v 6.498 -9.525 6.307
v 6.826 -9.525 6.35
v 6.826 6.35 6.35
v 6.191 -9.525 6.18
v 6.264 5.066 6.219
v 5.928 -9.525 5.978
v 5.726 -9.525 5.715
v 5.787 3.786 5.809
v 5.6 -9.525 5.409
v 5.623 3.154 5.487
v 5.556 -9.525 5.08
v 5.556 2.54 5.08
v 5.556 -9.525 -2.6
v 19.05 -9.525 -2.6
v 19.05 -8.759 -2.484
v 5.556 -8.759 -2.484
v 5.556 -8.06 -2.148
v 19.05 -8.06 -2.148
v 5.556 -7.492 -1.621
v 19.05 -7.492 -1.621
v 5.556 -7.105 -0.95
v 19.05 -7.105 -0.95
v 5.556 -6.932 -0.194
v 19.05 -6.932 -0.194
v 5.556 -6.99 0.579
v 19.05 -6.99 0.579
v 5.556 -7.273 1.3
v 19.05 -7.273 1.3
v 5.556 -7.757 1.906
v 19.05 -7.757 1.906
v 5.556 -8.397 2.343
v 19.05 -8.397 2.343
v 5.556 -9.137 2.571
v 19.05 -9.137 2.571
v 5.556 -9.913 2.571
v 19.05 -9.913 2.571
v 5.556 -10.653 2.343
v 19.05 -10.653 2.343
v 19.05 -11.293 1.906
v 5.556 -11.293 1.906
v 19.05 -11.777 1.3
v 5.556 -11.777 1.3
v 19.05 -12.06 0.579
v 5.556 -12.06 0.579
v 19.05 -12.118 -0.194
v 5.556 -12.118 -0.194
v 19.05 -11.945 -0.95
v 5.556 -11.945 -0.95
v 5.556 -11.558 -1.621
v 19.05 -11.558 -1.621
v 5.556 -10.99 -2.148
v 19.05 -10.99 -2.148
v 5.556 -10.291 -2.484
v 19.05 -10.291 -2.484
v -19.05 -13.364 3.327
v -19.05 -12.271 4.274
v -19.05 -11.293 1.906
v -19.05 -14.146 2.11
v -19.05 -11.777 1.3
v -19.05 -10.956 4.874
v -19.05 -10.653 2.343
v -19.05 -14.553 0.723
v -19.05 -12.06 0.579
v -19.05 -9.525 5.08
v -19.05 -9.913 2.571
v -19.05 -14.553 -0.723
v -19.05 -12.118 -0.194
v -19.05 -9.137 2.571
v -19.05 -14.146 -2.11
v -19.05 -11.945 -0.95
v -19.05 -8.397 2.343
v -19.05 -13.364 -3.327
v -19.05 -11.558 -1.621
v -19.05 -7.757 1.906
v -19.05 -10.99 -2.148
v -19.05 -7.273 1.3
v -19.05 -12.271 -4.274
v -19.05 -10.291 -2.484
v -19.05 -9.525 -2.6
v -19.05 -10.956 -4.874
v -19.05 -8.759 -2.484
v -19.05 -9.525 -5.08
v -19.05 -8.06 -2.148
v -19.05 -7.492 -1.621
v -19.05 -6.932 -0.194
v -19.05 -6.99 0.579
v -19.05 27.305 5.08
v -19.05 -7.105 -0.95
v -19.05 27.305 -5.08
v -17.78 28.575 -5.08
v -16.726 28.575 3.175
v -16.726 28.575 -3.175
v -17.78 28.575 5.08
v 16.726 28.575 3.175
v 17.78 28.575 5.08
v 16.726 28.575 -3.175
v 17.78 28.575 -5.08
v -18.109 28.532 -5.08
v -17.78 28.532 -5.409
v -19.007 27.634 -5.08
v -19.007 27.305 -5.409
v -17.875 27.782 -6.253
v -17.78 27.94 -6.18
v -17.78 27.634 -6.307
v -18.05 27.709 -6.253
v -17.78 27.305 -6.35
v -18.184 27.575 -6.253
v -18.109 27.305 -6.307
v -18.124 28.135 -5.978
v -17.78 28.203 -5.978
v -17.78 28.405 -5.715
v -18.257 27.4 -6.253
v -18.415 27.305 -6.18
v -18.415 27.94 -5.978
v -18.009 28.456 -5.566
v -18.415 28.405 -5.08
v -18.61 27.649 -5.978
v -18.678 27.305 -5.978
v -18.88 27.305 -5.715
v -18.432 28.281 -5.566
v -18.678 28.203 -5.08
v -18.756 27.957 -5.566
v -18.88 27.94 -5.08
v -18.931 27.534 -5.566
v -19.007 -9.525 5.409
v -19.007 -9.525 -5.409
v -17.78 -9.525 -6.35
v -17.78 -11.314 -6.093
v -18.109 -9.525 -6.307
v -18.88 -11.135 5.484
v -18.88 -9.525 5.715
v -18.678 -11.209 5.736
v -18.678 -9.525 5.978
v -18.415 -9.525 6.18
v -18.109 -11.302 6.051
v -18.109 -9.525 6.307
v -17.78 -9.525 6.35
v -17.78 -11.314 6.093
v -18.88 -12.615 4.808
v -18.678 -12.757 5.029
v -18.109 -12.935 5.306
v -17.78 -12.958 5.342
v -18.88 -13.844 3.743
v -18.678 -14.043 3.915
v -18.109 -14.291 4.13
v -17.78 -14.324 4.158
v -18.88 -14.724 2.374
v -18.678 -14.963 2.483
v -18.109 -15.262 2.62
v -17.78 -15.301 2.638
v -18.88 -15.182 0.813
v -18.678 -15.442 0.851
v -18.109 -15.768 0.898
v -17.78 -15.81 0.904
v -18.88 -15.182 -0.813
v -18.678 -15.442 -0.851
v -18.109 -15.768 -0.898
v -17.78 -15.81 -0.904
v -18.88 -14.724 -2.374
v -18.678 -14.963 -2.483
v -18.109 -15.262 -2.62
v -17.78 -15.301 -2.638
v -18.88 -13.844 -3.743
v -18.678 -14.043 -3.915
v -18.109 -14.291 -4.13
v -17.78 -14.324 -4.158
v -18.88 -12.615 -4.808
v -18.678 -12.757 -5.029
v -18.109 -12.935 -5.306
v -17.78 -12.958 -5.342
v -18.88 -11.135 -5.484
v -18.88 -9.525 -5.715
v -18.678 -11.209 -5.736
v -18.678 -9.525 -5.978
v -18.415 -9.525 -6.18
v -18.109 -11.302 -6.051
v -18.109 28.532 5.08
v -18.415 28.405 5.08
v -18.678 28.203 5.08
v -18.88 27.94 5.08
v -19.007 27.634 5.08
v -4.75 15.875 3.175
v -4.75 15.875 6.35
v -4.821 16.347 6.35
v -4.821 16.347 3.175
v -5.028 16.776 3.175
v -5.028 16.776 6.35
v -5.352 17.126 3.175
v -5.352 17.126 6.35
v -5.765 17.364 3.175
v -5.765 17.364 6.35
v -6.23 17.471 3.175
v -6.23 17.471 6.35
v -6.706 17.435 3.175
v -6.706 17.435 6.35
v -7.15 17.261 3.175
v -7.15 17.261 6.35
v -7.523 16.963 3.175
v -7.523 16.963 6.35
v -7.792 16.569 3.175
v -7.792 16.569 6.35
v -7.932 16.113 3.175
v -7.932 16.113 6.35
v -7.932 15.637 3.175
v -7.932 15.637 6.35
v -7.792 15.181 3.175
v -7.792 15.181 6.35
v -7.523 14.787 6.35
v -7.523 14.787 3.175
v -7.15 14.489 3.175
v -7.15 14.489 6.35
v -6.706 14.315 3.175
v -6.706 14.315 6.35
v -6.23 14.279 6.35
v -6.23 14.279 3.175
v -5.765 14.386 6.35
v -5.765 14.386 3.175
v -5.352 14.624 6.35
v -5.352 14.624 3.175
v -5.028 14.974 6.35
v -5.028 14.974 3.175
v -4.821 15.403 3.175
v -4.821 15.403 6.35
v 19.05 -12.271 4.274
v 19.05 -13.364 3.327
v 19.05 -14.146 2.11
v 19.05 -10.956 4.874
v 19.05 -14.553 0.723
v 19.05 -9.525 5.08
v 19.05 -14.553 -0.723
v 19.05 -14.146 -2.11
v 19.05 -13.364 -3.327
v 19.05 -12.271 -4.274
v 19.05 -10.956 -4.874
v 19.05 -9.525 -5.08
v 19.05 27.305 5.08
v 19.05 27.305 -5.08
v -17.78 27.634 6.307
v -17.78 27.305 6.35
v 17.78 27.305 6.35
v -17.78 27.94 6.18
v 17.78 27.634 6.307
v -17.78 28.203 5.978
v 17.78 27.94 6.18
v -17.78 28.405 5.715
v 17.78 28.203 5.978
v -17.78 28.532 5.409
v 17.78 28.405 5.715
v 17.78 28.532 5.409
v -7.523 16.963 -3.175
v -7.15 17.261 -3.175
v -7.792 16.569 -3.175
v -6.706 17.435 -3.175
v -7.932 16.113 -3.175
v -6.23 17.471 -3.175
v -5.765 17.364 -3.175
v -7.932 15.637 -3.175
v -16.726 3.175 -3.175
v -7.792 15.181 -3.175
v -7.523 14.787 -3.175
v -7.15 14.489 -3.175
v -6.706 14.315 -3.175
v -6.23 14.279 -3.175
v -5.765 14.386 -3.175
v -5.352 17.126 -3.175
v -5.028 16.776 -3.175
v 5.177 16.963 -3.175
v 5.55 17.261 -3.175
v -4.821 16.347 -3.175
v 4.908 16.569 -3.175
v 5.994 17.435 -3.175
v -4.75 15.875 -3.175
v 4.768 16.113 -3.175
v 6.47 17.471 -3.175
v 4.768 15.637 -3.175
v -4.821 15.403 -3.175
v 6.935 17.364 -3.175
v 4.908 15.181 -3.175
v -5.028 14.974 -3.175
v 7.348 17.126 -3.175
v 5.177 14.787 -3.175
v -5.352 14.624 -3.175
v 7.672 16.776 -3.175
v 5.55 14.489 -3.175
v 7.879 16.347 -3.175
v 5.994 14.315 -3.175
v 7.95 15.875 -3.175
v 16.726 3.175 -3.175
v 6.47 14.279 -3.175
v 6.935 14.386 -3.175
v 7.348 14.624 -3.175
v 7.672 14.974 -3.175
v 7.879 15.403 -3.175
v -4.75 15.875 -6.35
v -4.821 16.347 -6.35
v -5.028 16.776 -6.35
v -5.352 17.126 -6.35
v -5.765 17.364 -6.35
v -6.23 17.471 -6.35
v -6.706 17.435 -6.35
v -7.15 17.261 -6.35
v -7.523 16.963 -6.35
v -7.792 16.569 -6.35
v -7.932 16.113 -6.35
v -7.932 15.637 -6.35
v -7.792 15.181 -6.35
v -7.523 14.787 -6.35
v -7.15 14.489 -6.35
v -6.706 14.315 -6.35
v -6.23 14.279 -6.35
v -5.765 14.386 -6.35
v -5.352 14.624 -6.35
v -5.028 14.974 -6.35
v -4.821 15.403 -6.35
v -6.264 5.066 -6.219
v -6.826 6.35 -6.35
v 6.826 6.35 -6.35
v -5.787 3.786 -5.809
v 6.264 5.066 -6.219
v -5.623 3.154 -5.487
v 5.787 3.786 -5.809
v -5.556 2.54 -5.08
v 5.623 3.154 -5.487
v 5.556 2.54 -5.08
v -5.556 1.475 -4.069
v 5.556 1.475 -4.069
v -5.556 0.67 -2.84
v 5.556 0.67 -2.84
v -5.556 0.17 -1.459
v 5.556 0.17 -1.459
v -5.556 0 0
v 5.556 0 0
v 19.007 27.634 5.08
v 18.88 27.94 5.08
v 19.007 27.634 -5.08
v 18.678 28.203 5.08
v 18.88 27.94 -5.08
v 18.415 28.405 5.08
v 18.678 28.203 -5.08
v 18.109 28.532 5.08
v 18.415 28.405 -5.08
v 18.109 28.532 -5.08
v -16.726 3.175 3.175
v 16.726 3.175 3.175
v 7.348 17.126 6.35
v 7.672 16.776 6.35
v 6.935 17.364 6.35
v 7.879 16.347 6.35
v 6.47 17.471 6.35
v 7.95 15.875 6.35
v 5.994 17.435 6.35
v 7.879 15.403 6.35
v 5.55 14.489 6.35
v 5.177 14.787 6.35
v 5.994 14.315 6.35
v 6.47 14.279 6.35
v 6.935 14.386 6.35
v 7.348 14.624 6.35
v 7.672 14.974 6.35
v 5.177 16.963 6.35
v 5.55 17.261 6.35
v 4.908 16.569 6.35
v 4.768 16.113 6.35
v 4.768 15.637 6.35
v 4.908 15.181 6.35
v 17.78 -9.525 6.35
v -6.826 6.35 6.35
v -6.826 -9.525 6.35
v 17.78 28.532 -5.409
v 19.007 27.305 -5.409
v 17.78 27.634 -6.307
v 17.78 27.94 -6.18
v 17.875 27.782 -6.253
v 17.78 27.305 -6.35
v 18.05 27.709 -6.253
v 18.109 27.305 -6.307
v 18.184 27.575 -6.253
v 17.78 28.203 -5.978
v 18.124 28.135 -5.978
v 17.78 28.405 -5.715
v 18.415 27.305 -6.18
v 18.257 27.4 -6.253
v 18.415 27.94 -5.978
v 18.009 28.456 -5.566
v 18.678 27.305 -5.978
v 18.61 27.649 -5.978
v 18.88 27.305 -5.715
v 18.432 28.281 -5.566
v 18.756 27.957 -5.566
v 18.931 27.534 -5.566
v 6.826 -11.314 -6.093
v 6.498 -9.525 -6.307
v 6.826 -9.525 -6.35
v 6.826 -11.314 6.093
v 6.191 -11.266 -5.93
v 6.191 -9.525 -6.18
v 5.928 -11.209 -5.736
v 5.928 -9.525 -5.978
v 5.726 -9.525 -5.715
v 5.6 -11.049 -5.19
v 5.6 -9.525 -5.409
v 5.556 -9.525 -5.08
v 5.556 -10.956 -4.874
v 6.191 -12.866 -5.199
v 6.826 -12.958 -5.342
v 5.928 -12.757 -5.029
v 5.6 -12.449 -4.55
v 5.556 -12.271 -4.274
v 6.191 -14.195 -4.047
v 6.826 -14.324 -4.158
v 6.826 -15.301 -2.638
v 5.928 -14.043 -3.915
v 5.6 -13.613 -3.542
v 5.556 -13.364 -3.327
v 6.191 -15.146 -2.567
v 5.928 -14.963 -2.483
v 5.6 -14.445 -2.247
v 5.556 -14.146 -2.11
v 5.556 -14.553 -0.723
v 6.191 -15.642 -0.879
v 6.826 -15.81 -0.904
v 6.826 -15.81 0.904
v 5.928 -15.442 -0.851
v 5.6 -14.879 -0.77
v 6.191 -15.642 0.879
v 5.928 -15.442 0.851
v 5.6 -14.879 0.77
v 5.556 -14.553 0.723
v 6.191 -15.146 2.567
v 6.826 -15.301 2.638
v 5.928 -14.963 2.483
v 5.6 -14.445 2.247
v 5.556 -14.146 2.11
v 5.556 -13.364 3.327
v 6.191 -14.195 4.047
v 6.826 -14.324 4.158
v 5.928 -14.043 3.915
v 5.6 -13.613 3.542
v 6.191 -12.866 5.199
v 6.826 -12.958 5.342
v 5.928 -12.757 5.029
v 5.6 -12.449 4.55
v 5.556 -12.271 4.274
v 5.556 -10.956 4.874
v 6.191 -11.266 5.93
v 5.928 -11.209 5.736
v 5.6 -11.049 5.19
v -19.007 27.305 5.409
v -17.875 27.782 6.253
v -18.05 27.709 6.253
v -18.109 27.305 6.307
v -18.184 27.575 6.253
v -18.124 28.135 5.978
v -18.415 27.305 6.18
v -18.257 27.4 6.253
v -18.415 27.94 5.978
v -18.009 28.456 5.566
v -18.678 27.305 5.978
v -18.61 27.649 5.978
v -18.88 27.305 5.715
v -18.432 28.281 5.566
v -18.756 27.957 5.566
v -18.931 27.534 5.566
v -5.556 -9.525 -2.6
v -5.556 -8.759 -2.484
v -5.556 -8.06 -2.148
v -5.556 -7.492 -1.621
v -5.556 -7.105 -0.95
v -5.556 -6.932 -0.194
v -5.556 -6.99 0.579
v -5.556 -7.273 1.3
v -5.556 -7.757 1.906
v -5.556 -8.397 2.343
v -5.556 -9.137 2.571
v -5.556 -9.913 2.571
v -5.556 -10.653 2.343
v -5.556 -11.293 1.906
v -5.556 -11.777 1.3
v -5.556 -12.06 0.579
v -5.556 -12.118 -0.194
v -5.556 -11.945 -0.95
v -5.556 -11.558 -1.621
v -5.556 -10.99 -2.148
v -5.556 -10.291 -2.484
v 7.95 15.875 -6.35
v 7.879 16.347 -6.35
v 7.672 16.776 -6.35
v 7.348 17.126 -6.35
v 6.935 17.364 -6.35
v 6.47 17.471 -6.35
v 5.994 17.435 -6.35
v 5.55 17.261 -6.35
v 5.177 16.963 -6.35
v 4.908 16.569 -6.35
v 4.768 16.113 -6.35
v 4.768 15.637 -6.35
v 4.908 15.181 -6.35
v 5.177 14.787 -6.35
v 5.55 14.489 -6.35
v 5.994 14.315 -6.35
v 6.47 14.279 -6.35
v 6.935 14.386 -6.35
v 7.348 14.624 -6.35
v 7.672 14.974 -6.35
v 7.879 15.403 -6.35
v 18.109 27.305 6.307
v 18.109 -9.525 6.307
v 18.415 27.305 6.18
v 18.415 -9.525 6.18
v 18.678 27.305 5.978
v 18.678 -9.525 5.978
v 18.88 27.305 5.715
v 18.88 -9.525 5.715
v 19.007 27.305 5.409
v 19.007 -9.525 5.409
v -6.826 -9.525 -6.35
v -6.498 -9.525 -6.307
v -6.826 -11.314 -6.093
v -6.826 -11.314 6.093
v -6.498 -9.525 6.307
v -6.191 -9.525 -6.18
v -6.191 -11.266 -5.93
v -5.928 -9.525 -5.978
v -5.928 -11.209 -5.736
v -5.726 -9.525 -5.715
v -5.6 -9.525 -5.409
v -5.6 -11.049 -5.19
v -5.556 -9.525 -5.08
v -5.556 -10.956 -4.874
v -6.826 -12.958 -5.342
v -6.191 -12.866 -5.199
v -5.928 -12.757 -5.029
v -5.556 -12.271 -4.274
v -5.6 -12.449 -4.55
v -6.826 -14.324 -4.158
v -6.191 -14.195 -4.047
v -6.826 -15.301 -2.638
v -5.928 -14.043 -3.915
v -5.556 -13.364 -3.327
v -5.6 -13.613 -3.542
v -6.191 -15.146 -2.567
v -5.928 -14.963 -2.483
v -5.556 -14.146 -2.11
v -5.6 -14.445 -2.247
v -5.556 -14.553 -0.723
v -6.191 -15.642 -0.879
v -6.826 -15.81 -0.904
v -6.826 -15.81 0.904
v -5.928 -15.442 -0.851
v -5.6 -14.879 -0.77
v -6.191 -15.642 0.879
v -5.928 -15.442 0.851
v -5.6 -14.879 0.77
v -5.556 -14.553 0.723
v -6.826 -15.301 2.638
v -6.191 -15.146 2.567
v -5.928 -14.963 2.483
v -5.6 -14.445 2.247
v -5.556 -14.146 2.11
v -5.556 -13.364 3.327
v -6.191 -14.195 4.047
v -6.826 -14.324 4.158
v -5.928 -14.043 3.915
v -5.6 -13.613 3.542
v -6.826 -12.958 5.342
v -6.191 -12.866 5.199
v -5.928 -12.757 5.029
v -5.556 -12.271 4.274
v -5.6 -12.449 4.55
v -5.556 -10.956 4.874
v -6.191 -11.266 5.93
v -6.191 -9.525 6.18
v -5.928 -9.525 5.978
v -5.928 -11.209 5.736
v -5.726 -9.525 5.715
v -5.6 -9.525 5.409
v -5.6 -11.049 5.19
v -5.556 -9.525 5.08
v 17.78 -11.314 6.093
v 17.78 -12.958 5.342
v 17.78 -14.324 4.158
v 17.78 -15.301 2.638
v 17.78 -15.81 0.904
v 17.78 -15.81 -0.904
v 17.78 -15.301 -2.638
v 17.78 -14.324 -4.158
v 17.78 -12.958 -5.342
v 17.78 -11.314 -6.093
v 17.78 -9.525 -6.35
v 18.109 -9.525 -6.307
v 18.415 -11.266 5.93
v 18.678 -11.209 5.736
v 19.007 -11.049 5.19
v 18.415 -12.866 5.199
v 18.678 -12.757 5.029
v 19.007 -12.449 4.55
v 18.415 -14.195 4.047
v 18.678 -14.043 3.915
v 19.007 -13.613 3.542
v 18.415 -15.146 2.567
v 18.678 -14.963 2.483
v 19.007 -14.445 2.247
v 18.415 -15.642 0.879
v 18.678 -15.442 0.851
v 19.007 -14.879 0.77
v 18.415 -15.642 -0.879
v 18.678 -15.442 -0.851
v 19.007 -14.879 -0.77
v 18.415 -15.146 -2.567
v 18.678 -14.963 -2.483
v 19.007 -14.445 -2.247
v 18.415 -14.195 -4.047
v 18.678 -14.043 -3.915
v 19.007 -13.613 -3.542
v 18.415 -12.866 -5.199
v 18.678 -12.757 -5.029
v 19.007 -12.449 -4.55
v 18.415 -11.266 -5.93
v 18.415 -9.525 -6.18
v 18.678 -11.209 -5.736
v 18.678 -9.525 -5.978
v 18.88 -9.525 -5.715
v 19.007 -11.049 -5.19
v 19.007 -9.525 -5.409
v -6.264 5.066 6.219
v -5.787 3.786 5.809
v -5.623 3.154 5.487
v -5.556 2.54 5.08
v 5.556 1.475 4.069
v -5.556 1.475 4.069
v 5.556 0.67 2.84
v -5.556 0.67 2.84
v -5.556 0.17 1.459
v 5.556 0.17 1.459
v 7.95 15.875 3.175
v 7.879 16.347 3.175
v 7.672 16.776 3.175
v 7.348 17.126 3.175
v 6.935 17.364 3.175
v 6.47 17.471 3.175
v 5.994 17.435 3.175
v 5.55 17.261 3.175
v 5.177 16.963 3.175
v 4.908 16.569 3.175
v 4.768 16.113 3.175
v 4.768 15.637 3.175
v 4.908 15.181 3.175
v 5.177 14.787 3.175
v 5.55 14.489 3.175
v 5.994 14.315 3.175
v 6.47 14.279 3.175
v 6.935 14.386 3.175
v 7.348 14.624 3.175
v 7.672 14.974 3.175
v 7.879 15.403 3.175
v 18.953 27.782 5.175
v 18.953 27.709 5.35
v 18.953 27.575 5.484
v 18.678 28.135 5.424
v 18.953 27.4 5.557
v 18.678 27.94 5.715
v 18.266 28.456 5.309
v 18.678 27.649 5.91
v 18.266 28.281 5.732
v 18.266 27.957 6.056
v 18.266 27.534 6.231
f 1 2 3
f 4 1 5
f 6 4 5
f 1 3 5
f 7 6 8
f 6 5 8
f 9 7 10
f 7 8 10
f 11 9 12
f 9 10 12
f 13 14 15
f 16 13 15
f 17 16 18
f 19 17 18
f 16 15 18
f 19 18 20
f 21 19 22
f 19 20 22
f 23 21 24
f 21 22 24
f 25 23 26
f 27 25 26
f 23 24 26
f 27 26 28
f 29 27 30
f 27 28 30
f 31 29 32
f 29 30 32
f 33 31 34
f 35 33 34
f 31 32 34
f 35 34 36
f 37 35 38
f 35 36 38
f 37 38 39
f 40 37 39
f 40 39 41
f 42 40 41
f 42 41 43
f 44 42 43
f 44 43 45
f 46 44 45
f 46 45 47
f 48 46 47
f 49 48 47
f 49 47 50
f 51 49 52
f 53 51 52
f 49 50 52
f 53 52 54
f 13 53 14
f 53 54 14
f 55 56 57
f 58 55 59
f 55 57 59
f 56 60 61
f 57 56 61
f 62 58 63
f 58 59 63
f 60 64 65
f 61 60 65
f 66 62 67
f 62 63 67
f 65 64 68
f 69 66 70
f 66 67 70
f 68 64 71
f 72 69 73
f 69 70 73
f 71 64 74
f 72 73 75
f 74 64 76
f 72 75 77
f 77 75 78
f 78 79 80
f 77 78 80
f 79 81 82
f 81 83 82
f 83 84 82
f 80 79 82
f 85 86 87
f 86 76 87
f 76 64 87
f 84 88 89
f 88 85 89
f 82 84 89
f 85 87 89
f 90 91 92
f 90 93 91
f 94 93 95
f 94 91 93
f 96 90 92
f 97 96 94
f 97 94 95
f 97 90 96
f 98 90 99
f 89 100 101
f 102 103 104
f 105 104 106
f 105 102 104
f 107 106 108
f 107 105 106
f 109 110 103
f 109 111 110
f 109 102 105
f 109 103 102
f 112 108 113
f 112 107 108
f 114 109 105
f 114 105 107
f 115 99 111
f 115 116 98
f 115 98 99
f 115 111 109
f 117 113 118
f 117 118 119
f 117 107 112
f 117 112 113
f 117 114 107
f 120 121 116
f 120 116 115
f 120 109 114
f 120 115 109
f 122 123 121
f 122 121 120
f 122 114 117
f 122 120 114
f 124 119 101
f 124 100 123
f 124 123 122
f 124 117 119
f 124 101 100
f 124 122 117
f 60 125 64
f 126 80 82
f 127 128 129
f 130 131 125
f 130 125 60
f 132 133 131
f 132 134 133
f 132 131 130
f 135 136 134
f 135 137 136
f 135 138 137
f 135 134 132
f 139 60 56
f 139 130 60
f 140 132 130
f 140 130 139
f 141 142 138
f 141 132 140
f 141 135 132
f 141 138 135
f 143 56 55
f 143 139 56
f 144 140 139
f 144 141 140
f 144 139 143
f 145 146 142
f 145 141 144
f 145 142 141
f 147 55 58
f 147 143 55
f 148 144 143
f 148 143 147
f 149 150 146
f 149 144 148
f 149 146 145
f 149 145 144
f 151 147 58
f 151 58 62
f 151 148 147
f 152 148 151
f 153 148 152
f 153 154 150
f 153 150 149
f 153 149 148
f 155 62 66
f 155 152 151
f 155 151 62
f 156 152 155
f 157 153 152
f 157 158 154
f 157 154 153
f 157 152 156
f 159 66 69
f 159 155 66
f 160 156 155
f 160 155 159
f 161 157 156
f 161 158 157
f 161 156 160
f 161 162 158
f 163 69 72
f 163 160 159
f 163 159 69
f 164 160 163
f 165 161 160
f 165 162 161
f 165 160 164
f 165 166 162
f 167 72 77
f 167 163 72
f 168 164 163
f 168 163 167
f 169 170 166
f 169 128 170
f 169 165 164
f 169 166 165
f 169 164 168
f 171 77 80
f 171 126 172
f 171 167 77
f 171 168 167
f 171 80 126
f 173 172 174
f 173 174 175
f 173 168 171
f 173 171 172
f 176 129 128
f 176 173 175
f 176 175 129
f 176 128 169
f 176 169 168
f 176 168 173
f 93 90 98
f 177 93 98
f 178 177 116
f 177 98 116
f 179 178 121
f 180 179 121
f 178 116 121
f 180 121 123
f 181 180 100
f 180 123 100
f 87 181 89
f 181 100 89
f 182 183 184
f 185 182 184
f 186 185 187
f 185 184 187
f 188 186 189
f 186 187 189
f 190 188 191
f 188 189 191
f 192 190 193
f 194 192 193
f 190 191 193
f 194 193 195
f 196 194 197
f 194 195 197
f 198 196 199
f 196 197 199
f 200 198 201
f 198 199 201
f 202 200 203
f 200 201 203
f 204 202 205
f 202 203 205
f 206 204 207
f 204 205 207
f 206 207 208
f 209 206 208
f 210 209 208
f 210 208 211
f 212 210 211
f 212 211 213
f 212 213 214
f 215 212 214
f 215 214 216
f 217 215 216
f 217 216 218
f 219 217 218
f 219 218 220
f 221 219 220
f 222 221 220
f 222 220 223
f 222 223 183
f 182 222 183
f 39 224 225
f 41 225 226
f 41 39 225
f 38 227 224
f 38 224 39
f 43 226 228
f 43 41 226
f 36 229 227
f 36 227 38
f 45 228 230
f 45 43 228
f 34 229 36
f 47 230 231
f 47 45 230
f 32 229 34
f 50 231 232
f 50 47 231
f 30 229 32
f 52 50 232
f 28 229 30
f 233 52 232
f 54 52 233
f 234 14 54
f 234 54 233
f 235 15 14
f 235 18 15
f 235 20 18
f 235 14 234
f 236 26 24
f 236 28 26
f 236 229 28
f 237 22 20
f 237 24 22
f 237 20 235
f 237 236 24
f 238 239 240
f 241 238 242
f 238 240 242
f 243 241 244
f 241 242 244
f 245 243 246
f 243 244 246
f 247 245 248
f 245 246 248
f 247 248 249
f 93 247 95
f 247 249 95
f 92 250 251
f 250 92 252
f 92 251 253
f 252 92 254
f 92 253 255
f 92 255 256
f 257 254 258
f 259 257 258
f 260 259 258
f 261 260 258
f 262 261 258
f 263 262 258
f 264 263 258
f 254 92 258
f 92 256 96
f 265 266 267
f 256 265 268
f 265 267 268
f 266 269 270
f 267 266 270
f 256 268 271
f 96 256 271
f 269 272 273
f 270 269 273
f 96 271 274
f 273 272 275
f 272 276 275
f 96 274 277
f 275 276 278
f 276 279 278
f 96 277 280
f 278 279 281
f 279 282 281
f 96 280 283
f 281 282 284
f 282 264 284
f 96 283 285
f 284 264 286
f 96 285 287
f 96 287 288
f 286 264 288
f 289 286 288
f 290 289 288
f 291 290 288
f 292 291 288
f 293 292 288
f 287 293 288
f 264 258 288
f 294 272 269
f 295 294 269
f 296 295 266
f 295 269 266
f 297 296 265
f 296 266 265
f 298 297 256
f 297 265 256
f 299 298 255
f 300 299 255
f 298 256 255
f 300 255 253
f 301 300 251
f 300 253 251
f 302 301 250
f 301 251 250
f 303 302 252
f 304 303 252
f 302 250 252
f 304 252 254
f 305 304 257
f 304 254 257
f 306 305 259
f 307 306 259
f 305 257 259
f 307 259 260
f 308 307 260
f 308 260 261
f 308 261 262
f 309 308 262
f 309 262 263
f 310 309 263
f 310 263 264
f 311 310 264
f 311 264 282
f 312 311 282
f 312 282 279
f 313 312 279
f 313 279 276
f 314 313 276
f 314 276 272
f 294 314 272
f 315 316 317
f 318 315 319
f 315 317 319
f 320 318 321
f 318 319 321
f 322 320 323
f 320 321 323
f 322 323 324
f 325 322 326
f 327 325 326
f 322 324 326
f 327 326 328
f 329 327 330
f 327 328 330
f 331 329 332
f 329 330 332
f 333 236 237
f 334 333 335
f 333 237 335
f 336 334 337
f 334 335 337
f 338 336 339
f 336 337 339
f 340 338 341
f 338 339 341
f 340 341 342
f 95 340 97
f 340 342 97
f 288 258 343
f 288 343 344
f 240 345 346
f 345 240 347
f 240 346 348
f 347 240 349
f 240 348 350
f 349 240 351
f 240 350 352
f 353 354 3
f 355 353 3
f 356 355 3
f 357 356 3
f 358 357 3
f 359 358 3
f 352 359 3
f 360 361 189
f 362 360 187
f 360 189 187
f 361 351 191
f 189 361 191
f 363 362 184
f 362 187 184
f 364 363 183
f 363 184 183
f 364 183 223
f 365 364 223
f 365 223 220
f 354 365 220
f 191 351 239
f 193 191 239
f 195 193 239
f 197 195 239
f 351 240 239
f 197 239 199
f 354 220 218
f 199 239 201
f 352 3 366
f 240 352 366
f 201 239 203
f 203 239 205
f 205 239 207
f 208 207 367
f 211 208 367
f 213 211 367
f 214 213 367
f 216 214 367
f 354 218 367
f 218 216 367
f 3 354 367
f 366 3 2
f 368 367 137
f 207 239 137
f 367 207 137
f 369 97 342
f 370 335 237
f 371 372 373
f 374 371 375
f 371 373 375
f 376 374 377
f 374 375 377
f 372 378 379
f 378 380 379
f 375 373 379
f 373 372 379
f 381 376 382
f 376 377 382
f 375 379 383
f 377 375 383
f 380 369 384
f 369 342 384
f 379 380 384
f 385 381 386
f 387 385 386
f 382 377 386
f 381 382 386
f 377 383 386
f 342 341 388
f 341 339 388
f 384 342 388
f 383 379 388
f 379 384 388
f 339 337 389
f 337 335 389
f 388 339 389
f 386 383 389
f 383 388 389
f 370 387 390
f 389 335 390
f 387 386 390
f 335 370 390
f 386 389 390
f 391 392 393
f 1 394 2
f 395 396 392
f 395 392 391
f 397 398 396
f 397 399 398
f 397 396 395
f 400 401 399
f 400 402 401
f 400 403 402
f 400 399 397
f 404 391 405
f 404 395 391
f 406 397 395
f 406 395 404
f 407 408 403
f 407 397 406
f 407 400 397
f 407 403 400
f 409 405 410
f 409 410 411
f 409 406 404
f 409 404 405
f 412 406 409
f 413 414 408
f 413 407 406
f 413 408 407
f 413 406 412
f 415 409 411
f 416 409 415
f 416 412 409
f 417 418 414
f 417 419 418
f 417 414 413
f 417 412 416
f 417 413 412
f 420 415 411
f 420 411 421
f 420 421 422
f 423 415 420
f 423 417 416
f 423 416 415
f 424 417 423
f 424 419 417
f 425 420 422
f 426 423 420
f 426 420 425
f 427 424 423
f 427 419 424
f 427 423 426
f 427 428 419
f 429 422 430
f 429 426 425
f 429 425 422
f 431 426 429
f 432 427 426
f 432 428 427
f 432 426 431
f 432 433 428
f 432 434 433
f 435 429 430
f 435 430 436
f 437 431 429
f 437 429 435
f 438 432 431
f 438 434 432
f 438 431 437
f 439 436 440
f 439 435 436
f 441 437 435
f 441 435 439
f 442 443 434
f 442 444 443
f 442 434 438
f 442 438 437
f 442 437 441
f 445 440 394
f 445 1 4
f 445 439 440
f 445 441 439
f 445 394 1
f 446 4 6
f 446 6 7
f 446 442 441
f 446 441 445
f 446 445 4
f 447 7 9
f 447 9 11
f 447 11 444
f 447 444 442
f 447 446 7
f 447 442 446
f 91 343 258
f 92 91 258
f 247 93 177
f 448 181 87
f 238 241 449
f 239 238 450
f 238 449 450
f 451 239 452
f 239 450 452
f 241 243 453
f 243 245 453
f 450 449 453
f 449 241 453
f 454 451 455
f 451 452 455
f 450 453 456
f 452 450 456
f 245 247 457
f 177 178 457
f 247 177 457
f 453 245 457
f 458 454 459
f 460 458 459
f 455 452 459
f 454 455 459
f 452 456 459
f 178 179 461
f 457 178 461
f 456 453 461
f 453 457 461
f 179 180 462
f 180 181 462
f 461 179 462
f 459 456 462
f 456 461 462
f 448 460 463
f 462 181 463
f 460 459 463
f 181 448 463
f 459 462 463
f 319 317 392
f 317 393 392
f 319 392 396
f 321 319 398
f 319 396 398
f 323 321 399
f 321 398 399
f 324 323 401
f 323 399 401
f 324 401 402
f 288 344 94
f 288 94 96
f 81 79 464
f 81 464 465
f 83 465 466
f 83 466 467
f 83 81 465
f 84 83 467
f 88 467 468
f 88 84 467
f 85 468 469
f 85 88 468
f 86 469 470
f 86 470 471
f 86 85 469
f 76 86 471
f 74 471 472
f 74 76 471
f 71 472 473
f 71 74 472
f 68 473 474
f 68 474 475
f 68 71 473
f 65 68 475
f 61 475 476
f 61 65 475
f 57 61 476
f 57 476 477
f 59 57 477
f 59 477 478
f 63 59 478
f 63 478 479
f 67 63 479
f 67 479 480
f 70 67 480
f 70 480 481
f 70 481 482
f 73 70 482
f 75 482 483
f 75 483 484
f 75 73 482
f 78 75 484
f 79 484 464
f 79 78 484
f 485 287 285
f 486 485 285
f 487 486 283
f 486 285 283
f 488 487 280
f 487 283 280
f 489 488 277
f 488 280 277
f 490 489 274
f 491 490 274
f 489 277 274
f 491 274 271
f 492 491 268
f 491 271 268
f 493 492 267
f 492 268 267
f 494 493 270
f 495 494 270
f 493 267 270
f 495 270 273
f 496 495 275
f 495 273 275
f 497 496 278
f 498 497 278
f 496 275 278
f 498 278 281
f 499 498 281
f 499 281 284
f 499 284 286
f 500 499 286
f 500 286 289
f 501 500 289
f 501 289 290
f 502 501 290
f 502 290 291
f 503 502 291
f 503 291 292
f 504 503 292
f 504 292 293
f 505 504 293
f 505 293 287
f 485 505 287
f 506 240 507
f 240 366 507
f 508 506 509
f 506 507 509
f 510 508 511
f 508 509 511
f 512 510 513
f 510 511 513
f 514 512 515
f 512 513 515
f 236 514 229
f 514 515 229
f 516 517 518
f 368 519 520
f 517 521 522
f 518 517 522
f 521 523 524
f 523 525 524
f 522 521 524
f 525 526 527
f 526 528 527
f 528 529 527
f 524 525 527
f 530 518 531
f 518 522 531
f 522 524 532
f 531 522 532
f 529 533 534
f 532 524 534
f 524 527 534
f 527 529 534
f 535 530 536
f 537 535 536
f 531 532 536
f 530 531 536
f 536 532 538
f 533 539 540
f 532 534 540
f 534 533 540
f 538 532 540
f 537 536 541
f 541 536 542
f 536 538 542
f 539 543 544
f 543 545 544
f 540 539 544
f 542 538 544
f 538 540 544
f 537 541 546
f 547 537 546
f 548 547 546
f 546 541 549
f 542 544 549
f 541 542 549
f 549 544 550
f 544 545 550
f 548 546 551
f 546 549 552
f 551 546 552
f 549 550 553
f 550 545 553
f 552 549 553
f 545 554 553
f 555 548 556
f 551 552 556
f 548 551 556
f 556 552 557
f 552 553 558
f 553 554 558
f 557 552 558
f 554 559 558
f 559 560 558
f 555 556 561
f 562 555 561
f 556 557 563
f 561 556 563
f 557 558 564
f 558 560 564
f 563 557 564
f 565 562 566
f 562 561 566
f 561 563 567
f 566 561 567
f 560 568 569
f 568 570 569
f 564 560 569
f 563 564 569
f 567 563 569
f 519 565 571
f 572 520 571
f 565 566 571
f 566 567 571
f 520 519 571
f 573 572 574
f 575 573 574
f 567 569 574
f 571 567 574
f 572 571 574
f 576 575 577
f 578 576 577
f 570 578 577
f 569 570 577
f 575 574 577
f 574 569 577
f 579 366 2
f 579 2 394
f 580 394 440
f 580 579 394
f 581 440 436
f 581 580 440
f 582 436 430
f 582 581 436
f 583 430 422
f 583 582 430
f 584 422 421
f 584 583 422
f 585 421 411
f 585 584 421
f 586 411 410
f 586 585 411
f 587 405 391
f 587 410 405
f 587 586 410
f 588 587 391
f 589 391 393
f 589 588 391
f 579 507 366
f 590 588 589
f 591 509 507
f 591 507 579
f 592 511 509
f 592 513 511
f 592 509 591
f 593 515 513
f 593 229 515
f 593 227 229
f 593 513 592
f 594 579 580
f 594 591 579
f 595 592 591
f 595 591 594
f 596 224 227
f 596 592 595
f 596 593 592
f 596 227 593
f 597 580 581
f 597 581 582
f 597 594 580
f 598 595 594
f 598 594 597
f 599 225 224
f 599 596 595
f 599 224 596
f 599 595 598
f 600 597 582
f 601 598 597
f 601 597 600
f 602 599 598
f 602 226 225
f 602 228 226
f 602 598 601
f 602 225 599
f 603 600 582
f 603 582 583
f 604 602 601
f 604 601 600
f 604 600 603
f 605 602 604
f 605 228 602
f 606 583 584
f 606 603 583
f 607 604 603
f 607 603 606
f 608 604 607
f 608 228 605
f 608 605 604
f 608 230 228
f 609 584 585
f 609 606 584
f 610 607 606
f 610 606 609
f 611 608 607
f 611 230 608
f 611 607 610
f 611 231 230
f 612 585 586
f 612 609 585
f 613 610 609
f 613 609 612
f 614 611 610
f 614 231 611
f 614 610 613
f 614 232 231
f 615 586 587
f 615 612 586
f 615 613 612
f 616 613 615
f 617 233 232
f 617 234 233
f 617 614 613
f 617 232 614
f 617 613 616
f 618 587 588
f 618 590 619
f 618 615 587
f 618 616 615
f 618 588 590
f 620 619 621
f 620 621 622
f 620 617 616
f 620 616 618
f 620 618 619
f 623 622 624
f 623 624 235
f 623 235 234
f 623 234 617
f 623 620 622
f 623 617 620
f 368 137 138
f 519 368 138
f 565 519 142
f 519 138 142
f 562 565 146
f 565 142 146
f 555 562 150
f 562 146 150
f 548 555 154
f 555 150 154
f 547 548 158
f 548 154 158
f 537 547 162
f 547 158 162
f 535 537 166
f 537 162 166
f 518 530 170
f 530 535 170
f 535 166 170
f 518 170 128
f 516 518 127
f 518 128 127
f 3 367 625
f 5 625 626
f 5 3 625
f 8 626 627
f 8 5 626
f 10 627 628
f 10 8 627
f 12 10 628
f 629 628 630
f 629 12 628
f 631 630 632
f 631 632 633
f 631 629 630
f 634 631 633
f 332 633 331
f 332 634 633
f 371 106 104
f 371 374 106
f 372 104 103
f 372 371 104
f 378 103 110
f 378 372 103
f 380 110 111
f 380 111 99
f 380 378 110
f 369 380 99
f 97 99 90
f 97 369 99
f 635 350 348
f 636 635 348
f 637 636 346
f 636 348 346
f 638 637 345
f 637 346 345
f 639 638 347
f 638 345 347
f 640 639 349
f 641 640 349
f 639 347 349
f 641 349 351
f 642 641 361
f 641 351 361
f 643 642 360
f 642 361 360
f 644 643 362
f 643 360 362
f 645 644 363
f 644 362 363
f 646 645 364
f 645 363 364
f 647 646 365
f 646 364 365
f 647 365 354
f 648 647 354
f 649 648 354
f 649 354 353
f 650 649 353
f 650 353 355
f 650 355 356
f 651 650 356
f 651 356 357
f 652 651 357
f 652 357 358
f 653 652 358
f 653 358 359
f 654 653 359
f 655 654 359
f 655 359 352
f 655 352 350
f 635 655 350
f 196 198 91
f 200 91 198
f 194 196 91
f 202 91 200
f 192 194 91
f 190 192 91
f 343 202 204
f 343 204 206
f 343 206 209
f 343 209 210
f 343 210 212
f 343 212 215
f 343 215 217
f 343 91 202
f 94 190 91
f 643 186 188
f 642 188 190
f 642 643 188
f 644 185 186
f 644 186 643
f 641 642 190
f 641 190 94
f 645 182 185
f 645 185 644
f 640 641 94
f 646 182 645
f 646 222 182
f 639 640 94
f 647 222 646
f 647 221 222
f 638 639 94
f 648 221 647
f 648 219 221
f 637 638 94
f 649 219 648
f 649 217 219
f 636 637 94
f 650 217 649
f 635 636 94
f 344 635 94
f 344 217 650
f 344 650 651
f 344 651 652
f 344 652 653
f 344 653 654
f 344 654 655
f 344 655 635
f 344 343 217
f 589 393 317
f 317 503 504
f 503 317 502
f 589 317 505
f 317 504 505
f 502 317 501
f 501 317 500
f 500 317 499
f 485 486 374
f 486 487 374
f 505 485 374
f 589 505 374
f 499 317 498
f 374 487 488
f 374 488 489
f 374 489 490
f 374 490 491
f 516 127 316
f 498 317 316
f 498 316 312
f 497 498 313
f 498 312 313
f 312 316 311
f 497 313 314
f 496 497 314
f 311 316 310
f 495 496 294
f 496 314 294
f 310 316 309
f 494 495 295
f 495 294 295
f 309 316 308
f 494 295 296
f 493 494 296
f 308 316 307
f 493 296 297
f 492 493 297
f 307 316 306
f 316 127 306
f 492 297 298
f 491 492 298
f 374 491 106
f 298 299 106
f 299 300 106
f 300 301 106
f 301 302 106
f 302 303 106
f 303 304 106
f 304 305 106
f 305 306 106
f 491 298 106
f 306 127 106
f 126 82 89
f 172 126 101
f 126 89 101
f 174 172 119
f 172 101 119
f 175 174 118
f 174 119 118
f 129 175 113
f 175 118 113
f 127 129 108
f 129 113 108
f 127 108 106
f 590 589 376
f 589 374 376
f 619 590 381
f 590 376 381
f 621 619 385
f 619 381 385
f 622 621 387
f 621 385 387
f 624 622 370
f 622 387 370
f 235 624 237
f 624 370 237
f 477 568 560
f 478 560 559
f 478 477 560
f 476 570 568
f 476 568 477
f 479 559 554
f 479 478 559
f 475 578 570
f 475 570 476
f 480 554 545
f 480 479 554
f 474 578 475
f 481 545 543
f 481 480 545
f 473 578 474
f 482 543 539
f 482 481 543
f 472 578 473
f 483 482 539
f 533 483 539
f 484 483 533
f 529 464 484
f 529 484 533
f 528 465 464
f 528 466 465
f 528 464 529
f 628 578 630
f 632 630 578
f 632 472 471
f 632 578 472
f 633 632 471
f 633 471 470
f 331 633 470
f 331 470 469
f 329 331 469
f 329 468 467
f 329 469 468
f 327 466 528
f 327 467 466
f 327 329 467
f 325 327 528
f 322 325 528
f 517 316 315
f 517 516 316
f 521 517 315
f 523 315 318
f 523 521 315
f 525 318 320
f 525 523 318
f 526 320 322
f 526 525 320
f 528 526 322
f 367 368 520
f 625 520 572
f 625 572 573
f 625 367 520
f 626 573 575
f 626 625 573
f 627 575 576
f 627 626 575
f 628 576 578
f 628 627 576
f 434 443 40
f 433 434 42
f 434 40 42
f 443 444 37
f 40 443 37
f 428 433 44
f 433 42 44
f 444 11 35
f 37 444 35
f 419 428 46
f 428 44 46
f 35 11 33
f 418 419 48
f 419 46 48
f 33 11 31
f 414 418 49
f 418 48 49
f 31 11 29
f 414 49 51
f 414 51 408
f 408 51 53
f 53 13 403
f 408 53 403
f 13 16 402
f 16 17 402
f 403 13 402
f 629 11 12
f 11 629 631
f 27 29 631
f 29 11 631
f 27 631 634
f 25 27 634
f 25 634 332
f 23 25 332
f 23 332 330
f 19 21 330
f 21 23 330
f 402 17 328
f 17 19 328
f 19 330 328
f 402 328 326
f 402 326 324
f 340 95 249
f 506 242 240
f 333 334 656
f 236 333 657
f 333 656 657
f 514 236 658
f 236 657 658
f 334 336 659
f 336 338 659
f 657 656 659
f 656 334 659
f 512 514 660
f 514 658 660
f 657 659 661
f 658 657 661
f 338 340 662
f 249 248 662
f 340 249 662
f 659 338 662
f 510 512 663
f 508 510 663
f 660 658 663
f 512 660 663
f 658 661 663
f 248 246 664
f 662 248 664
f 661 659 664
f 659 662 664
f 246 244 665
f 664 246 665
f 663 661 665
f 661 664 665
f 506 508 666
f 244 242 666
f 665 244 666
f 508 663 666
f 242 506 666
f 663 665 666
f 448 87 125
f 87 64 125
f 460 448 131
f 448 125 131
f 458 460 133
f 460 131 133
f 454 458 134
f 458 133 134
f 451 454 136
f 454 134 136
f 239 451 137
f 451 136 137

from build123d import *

# Parameters (mm, degrees)
ESQUISSE1_W             = 38.1
ESQUISSE1_H             = 12.7
BOSS_EXTRU_1_DEPTH      = 3.175
ESQUISSE2_W             = 38.1
ESQUISSE2_H             = 12.7
ESQUISSE2_W_2           = 33.4518
ESQUISSE2_H_2           = 6.35
BOSS_EXTRU_2_DEPTH      = 25.4
ESQUISSE3_R             = 1.6
ENL_V_MAT_EXTRU_1_DEPTH = 25.4
ESQUISSE4_R             = 2.6
BOSS_EXTRU_3_DEPTH      = 13.49375
CONG_1_R                = 6.35
CONG_2_R                = 1.27


with BuildPart() as part:
    # Esquisse1 → Boss.-Extru.1 (new body)
    with BuildSketch(Plane(origin=(0, 0, 0), x_dir=(1, 0, 0), z_dir=(0, 1, 0))):
        Rectangle(ESQUISSE1_W, ESQUISSE1_H)
    extrude(amount=BOSS_EXTRU_1_DEPTH)

    # Esquisse2 → Boss.-Extru.2 (add)
    with BuildSketch(Plane(origin=(0, 3.175, 0), x_dir=(1, 0, 0), z_dir=(0, 1, 0))):
        Rectangle(ESQUISSE2_W, ESQUISSE2_H)
        Rectangle(ESQUISSE2_W_2, ESQUISSE2_H_2, mode=Mode.SUBTRACT)
    extrude(amount=BOSS_EXTRU_2_DEPTH)

    # Esquisse3 → Enlèv. mat.-Extru.1 (cut)
    with BuildSketch(Plane.XY.offset(6.35)):
        with Locations((-6.35, 15.875)):
            Circle(ESQUISSE3_R)
        with Locations((6.35, 15.875)):
            Circle(ESQUISSE3_R)
    extrude(amount=-ENL_V_MAT_EXTRU_1_DEPTH, mode=Mode.SUBTRACT)

    # Esquisse4 → Boss.-Extru.3 (add)
    with BuildSketch(Plane(origin=(19.05, 0, 0), x_dir=(0, 0, -1), z_dir=(1, 0, 0))):
        with BuildLine():
            Line((-6.35, 0), (-6.35, -9.525))
            ThreePointArc((-6.35, -9.525), (0, -15.875), (6.35, -9.525))
            Line((6.35, -9.525), (6.35, 0))
            Line((6.35, 0), (-6.35, 0))
        make_face()
        with Locations((0, -9.525)):
            Circle(ESQUISSE4_R, mode=Mode.SUBTRACT)
    boss_extru_3 = extrude(amount=-BOSS_EXTRU_3_DEPTH)

    # Symétrie1: Boss.-Extru.3 across plane
    add(boss_extru_3.mirror(Plane(origin=(0, 0, 0), x_dir=(0, 0, 1), z_dir=(1, 0, 0))))

    # Congé1
    cong_1_edges = [part.edges().sort_by_distance(p)[0] for p in [
        (0, 0, -6.35),
        (0, 0, 6.35),
    ]]
    fillet(cong_1_edges, radius=CONG_1_R - 0.0001)  # a hair under: the kernel refuses the full size

    # Congé2
    cong_2_edges = [part.edges().sort_by_distance(p)[0] for p in [
        (-19.05, 28.575, 0),
        (0, 28.575, 6.35),
        (19.05, 28.575, 0),
        (0, 28.575, -6.35),
        (5.55625, -1.58755, -6.35),
        (5.55625, -15.875, 0),
        (5.55625, -1.58755, 6.35),
        (19.05, -15.875, 0),
        (-5.55625, -1.58755, 6.35),
        (-5.55625, -15.875, 0),
        (-5.55625, -1.58755, -6.35),
        (-19.05, -15.875, 0),
        (19.05, 9.525, 6.35),
        (-19.05, 9.525, 6.35),
        (-19.05, 9.525, -6.35),
        (19.05, 9.525, -6.35),
    ]]
    fillet(cong_2_edges, radius=CONG_2_R)


solid = part.part
